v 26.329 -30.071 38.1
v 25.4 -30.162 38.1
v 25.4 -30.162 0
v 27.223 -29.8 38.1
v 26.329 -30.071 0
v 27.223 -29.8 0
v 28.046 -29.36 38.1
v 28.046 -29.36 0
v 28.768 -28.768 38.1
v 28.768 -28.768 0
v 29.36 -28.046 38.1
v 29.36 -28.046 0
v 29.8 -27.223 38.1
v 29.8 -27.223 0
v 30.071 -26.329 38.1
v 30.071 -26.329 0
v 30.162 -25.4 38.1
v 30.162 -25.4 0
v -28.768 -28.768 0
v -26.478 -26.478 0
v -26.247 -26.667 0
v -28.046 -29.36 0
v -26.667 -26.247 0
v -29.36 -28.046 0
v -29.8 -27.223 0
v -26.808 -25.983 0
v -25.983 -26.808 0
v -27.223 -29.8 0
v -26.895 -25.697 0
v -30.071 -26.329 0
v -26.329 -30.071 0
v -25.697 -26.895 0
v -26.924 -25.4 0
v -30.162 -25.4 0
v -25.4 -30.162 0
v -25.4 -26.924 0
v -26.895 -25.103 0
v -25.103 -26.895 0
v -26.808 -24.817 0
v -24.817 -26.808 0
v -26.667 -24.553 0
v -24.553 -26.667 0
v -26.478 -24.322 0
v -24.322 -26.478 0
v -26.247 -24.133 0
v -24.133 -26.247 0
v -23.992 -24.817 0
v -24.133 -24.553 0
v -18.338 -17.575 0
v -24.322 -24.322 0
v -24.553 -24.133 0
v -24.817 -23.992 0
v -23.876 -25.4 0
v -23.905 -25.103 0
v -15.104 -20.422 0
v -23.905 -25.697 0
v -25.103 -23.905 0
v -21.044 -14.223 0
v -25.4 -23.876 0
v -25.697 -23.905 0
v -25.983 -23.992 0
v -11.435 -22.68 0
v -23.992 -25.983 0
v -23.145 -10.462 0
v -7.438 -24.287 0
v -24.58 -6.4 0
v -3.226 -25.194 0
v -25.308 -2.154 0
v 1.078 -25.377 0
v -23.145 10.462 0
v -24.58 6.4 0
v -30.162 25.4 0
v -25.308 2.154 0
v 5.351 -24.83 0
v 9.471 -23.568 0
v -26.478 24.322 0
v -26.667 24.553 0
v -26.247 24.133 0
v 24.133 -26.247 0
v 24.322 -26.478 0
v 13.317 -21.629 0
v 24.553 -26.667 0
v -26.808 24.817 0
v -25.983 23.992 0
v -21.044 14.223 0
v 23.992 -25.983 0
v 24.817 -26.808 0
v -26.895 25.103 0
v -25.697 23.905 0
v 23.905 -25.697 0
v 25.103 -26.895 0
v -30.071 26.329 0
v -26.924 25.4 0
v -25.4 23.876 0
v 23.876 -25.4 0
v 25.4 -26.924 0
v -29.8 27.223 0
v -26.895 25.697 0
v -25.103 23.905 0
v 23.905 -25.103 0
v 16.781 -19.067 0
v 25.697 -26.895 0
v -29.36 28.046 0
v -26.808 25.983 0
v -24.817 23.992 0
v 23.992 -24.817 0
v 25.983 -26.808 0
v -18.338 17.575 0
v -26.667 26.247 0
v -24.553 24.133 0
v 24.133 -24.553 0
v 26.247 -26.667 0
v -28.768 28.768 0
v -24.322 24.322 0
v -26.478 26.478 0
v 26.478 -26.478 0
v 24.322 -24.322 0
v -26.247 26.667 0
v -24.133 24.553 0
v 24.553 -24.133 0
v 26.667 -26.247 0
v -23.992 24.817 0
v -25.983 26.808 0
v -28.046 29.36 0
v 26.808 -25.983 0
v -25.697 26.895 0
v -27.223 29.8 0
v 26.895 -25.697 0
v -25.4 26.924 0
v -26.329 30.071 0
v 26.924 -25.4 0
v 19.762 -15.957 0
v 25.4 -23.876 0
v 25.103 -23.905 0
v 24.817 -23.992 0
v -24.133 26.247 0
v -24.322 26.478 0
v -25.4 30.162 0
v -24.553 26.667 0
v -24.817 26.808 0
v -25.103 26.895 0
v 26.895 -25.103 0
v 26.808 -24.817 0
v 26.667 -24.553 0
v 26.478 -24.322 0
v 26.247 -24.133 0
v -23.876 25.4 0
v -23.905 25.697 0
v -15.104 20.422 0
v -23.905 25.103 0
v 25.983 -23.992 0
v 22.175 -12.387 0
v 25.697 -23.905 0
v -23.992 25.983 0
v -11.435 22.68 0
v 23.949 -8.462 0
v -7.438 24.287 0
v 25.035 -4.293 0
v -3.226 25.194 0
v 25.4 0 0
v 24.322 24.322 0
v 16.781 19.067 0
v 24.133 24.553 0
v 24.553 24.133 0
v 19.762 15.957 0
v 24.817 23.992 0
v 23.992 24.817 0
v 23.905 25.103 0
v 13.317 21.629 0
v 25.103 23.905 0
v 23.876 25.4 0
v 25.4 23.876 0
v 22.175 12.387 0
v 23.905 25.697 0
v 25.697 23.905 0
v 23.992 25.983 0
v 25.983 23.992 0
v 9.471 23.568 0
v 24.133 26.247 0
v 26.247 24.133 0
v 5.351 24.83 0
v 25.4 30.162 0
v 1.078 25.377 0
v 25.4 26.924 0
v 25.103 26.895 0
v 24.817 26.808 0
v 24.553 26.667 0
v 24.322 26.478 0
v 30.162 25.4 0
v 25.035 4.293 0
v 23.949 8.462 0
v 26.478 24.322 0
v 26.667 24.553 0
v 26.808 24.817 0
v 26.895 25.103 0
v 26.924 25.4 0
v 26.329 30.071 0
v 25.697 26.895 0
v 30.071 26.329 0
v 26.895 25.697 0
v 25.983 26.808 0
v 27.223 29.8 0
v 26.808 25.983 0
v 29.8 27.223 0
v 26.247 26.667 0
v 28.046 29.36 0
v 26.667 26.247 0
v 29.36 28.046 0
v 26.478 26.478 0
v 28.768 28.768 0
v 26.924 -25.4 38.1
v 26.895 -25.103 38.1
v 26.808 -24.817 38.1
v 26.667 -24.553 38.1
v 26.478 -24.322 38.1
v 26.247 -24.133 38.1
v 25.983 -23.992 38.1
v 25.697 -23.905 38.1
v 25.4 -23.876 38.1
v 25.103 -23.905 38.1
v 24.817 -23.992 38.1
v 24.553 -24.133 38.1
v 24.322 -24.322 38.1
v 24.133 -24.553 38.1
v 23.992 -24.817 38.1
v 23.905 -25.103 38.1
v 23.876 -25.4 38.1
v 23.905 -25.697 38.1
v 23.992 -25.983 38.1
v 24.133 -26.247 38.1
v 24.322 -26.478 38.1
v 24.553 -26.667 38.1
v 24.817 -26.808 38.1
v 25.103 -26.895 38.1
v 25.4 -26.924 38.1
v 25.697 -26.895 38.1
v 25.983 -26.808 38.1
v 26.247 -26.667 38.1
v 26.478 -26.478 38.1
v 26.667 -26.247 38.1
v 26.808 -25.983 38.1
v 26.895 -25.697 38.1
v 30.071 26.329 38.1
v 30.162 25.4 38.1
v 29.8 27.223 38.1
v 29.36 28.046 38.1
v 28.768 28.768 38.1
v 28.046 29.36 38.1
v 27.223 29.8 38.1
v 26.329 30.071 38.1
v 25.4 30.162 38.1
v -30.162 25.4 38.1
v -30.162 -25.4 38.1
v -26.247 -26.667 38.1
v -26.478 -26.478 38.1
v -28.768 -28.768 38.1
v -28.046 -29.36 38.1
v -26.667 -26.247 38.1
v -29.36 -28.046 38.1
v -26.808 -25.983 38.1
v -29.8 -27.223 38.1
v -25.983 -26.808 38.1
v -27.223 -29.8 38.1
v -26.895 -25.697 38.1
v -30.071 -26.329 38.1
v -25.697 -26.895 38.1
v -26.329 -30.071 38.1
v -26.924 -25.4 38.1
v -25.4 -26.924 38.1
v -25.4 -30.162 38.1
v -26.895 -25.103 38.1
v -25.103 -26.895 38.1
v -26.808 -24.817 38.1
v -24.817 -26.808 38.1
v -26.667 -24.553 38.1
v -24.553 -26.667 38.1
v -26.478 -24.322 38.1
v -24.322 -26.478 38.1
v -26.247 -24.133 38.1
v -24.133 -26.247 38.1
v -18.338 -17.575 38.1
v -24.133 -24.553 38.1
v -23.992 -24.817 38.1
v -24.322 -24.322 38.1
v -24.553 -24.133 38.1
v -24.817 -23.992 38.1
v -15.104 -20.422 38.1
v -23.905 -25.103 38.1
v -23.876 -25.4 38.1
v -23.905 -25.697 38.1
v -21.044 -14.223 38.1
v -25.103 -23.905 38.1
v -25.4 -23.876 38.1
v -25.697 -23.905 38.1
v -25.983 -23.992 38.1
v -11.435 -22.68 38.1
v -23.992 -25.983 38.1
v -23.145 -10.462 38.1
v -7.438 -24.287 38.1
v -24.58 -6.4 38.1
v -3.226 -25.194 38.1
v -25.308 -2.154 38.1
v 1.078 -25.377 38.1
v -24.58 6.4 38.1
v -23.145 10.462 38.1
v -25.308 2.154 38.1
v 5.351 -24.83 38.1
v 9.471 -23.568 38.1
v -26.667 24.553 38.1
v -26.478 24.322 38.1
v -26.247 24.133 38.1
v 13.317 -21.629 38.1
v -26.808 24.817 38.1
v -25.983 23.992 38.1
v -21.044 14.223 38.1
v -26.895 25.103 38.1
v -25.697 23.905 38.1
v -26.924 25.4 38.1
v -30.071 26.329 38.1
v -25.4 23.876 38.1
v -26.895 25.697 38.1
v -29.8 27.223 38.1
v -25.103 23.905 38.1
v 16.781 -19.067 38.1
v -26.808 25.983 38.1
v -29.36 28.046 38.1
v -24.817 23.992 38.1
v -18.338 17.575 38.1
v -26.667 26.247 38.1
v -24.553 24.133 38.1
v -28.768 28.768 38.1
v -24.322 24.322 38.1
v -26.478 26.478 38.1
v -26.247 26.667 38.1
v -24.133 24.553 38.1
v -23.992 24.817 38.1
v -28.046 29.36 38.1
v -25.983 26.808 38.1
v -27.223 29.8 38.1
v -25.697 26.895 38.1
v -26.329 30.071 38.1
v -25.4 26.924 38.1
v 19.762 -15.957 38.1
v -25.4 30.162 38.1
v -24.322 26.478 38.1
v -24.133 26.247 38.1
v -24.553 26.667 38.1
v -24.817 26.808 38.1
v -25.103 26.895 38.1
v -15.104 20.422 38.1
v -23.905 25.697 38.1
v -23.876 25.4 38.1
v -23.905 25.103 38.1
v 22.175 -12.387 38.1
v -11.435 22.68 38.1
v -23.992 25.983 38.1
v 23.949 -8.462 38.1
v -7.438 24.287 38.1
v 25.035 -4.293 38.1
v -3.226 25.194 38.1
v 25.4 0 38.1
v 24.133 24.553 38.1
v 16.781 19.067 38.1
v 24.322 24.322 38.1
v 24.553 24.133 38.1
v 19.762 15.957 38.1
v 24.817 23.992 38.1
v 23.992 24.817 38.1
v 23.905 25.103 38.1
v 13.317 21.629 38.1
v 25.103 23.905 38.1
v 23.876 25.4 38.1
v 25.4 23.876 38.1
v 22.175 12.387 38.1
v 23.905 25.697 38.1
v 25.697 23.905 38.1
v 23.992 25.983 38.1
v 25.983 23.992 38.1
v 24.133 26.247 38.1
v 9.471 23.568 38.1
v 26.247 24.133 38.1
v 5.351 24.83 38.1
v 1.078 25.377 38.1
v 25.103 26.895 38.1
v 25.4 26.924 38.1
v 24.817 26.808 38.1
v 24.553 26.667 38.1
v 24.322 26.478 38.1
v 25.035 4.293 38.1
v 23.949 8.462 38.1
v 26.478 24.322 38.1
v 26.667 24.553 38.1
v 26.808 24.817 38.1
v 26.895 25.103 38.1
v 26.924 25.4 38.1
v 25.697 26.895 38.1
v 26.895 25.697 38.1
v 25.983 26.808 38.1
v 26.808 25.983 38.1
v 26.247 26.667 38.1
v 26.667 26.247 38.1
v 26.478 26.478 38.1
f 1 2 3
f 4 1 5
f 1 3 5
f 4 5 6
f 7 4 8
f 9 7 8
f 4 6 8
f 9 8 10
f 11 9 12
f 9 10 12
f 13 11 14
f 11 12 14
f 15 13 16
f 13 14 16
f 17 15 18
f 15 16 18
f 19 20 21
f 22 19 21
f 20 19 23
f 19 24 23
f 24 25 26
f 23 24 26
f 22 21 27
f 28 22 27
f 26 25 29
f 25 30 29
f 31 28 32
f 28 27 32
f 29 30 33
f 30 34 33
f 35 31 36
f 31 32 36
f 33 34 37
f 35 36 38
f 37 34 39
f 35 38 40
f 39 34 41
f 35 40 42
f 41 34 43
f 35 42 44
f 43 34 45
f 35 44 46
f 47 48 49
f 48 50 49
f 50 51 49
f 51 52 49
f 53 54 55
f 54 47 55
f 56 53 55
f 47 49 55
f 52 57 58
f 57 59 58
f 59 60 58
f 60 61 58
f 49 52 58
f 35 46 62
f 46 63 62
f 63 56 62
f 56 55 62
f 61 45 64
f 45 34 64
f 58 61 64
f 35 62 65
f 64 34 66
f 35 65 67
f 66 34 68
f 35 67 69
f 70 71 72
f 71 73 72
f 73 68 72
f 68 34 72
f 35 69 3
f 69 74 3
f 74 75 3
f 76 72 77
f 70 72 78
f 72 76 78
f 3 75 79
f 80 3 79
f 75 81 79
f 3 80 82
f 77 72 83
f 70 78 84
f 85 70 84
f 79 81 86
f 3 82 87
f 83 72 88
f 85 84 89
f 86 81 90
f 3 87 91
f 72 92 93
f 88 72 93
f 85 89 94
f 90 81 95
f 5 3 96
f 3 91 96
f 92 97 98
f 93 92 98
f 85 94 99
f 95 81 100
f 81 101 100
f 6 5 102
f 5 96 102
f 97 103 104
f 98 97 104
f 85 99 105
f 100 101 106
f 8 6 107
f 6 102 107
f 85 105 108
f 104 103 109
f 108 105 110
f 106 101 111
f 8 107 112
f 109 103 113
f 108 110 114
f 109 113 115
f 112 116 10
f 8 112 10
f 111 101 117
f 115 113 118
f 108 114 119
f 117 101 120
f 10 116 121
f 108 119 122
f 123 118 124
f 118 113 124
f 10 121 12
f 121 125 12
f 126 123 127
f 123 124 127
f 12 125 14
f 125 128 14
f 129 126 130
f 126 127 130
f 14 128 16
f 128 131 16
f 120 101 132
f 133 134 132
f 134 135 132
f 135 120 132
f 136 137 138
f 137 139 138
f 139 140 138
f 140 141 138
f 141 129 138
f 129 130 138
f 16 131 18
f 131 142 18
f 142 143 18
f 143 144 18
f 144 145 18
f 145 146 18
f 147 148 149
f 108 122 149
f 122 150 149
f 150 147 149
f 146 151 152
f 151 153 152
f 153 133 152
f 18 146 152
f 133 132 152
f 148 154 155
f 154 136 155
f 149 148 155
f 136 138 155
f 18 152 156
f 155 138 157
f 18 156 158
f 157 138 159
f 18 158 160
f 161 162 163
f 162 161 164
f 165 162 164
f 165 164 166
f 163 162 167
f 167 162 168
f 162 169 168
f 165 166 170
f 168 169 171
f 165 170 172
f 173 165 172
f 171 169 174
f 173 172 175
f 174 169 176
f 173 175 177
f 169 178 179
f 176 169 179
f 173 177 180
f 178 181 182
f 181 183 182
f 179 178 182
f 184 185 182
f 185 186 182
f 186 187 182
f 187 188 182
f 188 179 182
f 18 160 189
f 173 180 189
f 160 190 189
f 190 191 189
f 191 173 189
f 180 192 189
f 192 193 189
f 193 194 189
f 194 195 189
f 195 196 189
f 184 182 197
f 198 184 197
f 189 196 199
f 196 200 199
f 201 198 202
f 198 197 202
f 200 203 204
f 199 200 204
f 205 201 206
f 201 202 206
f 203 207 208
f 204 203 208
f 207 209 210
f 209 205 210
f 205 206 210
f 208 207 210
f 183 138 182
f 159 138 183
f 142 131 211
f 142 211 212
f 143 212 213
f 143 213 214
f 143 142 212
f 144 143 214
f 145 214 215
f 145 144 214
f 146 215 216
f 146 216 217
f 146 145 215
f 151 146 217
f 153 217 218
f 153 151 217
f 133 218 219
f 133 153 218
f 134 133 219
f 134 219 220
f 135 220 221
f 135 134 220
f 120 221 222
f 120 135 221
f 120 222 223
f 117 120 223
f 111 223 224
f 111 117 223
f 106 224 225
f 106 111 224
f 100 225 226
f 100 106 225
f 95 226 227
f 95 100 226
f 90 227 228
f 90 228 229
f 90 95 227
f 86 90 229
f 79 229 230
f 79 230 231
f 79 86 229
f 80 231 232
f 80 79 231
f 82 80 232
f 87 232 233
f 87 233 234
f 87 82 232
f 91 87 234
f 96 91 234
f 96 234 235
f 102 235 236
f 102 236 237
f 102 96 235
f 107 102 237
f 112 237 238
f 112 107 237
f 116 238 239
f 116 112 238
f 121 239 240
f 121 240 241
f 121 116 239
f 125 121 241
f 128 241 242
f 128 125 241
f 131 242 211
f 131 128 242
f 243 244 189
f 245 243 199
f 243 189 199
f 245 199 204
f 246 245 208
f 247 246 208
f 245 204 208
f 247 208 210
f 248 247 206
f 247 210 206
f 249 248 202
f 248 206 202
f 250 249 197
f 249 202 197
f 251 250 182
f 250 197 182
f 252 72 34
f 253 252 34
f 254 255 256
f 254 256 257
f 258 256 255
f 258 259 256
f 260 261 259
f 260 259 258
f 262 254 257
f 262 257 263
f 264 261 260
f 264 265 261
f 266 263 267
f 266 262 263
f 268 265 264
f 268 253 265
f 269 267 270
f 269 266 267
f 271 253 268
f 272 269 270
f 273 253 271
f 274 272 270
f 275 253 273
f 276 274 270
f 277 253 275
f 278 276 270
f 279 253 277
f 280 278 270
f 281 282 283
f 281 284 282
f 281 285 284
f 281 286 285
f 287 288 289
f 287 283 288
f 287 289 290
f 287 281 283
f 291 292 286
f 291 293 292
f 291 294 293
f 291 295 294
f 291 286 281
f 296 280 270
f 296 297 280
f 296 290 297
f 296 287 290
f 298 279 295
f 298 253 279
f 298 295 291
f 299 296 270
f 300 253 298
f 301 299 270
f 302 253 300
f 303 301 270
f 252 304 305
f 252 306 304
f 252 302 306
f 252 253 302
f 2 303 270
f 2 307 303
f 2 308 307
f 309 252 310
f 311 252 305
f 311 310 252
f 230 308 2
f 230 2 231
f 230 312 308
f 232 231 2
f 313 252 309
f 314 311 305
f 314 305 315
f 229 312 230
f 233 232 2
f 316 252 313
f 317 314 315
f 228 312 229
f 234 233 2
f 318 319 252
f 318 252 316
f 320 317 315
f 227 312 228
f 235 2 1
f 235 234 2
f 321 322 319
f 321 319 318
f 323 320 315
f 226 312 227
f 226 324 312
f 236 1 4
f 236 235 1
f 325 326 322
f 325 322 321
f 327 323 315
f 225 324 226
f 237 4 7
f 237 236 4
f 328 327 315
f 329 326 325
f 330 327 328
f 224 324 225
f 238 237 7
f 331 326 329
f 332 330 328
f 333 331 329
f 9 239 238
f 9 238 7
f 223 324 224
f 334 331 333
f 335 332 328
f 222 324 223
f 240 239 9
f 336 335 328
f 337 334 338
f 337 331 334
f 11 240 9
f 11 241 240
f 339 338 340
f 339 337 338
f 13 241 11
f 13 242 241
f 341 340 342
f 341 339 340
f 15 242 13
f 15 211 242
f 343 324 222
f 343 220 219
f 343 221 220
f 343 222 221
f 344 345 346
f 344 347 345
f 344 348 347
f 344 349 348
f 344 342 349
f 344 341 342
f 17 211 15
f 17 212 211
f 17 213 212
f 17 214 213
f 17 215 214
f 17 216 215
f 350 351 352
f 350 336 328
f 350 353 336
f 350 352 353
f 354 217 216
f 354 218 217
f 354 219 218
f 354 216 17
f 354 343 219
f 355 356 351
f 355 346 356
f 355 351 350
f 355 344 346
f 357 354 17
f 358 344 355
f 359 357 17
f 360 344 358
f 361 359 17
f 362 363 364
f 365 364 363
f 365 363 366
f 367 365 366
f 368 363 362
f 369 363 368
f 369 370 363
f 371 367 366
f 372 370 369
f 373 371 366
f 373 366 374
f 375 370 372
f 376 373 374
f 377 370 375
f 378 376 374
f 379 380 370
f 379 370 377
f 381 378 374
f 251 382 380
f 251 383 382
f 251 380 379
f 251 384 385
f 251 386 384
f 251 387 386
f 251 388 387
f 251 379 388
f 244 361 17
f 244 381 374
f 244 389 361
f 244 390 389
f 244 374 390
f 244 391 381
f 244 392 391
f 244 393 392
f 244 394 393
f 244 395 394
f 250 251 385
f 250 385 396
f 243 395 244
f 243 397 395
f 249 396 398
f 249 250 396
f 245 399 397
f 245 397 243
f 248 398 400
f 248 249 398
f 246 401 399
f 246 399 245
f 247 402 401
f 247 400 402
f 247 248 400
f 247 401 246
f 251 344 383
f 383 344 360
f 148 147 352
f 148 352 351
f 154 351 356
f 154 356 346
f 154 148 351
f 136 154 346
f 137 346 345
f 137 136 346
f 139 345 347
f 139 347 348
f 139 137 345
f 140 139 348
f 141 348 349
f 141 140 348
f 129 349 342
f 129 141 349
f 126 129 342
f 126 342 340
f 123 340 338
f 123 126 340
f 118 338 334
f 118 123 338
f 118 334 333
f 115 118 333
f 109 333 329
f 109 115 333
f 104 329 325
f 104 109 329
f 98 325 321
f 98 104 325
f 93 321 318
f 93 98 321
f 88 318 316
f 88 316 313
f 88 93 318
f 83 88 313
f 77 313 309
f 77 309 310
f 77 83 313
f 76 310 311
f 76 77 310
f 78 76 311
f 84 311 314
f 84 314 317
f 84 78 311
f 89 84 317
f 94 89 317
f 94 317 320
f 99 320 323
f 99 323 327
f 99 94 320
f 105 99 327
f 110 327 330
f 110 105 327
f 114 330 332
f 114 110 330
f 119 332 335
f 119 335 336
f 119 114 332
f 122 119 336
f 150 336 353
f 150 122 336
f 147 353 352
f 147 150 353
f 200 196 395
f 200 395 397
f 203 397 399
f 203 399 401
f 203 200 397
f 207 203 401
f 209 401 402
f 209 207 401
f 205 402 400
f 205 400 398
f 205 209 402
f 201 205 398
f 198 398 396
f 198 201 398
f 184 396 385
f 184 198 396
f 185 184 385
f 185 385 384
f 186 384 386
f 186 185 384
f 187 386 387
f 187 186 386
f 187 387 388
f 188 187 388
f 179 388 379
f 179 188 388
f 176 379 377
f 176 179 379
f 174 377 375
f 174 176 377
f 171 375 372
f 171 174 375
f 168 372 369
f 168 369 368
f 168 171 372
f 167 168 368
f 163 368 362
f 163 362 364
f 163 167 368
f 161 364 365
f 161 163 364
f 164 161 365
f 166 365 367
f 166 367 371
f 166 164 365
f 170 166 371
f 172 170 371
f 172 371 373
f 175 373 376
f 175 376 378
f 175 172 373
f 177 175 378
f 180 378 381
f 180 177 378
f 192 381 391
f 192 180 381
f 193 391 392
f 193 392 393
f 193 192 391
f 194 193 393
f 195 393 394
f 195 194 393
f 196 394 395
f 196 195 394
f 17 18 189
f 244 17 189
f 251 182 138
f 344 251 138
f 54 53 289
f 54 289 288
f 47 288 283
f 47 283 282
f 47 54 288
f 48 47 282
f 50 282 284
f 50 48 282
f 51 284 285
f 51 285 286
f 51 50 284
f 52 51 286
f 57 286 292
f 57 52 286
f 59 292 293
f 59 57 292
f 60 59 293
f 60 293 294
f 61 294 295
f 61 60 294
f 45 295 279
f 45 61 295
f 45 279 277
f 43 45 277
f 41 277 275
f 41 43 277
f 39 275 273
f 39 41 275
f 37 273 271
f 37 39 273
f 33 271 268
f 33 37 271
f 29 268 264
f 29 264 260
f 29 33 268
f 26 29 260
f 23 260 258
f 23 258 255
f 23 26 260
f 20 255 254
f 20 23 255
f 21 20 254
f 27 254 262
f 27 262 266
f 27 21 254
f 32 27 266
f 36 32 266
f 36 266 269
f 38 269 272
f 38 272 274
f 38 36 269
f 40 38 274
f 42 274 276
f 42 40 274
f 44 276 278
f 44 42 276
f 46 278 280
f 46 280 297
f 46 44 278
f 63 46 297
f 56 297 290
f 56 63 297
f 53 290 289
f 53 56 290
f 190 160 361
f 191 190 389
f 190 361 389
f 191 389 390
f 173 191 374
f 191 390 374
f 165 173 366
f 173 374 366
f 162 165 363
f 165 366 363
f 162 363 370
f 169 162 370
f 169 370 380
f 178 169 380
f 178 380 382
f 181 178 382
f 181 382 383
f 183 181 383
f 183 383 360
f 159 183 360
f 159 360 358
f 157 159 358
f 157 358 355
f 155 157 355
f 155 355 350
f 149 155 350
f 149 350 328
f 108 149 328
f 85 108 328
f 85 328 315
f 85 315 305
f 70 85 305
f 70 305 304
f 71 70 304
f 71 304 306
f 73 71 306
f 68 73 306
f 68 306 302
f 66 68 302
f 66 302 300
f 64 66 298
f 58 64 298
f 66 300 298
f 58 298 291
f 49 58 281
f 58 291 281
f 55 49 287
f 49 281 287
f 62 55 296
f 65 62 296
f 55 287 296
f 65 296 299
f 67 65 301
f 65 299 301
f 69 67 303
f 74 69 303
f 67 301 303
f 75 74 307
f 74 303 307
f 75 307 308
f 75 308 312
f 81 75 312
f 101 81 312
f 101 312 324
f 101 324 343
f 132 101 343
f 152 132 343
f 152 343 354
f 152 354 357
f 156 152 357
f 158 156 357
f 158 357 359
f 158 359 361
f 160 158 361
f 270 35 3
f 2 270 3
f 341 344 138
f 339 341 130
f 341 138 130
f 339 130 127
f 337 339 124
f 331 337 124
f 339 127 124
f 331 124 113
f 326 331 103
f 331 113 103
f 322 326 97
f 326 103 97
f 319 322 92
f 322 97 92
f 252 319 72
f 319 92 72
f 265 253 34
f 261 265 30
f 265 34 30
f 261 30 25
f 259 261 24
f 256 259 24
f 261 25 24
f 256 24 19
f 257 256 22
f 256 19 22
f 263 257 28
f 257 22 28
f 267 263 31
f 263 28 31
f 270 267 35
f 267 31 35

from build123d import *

# Parameters (mm, degrees)
F0_R     = 1.524
F1_DEPTH = 38.1
F2_R     = 25.4
F3_DEPTH = 38.101


with BuildPart() as f1:
    # F0 (on Top) → F1 (new body)
    with BuildSketch(Plane.XY):
        with BuildLine():
            ThreePointArc((30.1625, 25.4), (28.767596, 28.767596), (25.4, 30.1625))
            Line((25.4, 30.1625), (-25.4, 30.1625))
            ThreePointArc((-25.4, 30.1625), (-28.767596, 28.767596), (-30.1625, 25.4))
            Line((-30.1625, 25.4), (-30.1625, -25.4))
            ThreePointArc((-30.1625, -25.4), (-28.767596, -28.767596), (-25.4, -30.1625))
            Line((-25.4, -30.1625), (25.4, -30.1625))
            ThreePointArc((25.4, -30.1625), (28.767596, -28.767596), (30.1625, -25.4))
            Line((30.1625, -25.4), (30.1625, 25.4))
        make_face()
        with Locations((-25.4, -25.4)):
            Circle(F0_R, mode=Mode.SUBTRACT)
        with Locations((25.4, -25.4)):
            Circle(F0_R, mode=Mode.SUBTRACT)
        with Locations((-25.4, 25.4)):
            Circle(F0_R, mode=Mode.SUBTRACT)
        with Locations((25.4, 25.4)):
            Circle(F0_R, mode=Mode.SUBTRACT)
    extrude(amount=F1_DEPTH)

    # F2 (on face) → F3 (cut, through all)
    with BuildSketch(Plane.XY.offset(38.1)):
        Circle(F2_R)
    extrude(amount=-F3_DEPTH, mode=Mode.SUBTRACT)


solid = f1.part
